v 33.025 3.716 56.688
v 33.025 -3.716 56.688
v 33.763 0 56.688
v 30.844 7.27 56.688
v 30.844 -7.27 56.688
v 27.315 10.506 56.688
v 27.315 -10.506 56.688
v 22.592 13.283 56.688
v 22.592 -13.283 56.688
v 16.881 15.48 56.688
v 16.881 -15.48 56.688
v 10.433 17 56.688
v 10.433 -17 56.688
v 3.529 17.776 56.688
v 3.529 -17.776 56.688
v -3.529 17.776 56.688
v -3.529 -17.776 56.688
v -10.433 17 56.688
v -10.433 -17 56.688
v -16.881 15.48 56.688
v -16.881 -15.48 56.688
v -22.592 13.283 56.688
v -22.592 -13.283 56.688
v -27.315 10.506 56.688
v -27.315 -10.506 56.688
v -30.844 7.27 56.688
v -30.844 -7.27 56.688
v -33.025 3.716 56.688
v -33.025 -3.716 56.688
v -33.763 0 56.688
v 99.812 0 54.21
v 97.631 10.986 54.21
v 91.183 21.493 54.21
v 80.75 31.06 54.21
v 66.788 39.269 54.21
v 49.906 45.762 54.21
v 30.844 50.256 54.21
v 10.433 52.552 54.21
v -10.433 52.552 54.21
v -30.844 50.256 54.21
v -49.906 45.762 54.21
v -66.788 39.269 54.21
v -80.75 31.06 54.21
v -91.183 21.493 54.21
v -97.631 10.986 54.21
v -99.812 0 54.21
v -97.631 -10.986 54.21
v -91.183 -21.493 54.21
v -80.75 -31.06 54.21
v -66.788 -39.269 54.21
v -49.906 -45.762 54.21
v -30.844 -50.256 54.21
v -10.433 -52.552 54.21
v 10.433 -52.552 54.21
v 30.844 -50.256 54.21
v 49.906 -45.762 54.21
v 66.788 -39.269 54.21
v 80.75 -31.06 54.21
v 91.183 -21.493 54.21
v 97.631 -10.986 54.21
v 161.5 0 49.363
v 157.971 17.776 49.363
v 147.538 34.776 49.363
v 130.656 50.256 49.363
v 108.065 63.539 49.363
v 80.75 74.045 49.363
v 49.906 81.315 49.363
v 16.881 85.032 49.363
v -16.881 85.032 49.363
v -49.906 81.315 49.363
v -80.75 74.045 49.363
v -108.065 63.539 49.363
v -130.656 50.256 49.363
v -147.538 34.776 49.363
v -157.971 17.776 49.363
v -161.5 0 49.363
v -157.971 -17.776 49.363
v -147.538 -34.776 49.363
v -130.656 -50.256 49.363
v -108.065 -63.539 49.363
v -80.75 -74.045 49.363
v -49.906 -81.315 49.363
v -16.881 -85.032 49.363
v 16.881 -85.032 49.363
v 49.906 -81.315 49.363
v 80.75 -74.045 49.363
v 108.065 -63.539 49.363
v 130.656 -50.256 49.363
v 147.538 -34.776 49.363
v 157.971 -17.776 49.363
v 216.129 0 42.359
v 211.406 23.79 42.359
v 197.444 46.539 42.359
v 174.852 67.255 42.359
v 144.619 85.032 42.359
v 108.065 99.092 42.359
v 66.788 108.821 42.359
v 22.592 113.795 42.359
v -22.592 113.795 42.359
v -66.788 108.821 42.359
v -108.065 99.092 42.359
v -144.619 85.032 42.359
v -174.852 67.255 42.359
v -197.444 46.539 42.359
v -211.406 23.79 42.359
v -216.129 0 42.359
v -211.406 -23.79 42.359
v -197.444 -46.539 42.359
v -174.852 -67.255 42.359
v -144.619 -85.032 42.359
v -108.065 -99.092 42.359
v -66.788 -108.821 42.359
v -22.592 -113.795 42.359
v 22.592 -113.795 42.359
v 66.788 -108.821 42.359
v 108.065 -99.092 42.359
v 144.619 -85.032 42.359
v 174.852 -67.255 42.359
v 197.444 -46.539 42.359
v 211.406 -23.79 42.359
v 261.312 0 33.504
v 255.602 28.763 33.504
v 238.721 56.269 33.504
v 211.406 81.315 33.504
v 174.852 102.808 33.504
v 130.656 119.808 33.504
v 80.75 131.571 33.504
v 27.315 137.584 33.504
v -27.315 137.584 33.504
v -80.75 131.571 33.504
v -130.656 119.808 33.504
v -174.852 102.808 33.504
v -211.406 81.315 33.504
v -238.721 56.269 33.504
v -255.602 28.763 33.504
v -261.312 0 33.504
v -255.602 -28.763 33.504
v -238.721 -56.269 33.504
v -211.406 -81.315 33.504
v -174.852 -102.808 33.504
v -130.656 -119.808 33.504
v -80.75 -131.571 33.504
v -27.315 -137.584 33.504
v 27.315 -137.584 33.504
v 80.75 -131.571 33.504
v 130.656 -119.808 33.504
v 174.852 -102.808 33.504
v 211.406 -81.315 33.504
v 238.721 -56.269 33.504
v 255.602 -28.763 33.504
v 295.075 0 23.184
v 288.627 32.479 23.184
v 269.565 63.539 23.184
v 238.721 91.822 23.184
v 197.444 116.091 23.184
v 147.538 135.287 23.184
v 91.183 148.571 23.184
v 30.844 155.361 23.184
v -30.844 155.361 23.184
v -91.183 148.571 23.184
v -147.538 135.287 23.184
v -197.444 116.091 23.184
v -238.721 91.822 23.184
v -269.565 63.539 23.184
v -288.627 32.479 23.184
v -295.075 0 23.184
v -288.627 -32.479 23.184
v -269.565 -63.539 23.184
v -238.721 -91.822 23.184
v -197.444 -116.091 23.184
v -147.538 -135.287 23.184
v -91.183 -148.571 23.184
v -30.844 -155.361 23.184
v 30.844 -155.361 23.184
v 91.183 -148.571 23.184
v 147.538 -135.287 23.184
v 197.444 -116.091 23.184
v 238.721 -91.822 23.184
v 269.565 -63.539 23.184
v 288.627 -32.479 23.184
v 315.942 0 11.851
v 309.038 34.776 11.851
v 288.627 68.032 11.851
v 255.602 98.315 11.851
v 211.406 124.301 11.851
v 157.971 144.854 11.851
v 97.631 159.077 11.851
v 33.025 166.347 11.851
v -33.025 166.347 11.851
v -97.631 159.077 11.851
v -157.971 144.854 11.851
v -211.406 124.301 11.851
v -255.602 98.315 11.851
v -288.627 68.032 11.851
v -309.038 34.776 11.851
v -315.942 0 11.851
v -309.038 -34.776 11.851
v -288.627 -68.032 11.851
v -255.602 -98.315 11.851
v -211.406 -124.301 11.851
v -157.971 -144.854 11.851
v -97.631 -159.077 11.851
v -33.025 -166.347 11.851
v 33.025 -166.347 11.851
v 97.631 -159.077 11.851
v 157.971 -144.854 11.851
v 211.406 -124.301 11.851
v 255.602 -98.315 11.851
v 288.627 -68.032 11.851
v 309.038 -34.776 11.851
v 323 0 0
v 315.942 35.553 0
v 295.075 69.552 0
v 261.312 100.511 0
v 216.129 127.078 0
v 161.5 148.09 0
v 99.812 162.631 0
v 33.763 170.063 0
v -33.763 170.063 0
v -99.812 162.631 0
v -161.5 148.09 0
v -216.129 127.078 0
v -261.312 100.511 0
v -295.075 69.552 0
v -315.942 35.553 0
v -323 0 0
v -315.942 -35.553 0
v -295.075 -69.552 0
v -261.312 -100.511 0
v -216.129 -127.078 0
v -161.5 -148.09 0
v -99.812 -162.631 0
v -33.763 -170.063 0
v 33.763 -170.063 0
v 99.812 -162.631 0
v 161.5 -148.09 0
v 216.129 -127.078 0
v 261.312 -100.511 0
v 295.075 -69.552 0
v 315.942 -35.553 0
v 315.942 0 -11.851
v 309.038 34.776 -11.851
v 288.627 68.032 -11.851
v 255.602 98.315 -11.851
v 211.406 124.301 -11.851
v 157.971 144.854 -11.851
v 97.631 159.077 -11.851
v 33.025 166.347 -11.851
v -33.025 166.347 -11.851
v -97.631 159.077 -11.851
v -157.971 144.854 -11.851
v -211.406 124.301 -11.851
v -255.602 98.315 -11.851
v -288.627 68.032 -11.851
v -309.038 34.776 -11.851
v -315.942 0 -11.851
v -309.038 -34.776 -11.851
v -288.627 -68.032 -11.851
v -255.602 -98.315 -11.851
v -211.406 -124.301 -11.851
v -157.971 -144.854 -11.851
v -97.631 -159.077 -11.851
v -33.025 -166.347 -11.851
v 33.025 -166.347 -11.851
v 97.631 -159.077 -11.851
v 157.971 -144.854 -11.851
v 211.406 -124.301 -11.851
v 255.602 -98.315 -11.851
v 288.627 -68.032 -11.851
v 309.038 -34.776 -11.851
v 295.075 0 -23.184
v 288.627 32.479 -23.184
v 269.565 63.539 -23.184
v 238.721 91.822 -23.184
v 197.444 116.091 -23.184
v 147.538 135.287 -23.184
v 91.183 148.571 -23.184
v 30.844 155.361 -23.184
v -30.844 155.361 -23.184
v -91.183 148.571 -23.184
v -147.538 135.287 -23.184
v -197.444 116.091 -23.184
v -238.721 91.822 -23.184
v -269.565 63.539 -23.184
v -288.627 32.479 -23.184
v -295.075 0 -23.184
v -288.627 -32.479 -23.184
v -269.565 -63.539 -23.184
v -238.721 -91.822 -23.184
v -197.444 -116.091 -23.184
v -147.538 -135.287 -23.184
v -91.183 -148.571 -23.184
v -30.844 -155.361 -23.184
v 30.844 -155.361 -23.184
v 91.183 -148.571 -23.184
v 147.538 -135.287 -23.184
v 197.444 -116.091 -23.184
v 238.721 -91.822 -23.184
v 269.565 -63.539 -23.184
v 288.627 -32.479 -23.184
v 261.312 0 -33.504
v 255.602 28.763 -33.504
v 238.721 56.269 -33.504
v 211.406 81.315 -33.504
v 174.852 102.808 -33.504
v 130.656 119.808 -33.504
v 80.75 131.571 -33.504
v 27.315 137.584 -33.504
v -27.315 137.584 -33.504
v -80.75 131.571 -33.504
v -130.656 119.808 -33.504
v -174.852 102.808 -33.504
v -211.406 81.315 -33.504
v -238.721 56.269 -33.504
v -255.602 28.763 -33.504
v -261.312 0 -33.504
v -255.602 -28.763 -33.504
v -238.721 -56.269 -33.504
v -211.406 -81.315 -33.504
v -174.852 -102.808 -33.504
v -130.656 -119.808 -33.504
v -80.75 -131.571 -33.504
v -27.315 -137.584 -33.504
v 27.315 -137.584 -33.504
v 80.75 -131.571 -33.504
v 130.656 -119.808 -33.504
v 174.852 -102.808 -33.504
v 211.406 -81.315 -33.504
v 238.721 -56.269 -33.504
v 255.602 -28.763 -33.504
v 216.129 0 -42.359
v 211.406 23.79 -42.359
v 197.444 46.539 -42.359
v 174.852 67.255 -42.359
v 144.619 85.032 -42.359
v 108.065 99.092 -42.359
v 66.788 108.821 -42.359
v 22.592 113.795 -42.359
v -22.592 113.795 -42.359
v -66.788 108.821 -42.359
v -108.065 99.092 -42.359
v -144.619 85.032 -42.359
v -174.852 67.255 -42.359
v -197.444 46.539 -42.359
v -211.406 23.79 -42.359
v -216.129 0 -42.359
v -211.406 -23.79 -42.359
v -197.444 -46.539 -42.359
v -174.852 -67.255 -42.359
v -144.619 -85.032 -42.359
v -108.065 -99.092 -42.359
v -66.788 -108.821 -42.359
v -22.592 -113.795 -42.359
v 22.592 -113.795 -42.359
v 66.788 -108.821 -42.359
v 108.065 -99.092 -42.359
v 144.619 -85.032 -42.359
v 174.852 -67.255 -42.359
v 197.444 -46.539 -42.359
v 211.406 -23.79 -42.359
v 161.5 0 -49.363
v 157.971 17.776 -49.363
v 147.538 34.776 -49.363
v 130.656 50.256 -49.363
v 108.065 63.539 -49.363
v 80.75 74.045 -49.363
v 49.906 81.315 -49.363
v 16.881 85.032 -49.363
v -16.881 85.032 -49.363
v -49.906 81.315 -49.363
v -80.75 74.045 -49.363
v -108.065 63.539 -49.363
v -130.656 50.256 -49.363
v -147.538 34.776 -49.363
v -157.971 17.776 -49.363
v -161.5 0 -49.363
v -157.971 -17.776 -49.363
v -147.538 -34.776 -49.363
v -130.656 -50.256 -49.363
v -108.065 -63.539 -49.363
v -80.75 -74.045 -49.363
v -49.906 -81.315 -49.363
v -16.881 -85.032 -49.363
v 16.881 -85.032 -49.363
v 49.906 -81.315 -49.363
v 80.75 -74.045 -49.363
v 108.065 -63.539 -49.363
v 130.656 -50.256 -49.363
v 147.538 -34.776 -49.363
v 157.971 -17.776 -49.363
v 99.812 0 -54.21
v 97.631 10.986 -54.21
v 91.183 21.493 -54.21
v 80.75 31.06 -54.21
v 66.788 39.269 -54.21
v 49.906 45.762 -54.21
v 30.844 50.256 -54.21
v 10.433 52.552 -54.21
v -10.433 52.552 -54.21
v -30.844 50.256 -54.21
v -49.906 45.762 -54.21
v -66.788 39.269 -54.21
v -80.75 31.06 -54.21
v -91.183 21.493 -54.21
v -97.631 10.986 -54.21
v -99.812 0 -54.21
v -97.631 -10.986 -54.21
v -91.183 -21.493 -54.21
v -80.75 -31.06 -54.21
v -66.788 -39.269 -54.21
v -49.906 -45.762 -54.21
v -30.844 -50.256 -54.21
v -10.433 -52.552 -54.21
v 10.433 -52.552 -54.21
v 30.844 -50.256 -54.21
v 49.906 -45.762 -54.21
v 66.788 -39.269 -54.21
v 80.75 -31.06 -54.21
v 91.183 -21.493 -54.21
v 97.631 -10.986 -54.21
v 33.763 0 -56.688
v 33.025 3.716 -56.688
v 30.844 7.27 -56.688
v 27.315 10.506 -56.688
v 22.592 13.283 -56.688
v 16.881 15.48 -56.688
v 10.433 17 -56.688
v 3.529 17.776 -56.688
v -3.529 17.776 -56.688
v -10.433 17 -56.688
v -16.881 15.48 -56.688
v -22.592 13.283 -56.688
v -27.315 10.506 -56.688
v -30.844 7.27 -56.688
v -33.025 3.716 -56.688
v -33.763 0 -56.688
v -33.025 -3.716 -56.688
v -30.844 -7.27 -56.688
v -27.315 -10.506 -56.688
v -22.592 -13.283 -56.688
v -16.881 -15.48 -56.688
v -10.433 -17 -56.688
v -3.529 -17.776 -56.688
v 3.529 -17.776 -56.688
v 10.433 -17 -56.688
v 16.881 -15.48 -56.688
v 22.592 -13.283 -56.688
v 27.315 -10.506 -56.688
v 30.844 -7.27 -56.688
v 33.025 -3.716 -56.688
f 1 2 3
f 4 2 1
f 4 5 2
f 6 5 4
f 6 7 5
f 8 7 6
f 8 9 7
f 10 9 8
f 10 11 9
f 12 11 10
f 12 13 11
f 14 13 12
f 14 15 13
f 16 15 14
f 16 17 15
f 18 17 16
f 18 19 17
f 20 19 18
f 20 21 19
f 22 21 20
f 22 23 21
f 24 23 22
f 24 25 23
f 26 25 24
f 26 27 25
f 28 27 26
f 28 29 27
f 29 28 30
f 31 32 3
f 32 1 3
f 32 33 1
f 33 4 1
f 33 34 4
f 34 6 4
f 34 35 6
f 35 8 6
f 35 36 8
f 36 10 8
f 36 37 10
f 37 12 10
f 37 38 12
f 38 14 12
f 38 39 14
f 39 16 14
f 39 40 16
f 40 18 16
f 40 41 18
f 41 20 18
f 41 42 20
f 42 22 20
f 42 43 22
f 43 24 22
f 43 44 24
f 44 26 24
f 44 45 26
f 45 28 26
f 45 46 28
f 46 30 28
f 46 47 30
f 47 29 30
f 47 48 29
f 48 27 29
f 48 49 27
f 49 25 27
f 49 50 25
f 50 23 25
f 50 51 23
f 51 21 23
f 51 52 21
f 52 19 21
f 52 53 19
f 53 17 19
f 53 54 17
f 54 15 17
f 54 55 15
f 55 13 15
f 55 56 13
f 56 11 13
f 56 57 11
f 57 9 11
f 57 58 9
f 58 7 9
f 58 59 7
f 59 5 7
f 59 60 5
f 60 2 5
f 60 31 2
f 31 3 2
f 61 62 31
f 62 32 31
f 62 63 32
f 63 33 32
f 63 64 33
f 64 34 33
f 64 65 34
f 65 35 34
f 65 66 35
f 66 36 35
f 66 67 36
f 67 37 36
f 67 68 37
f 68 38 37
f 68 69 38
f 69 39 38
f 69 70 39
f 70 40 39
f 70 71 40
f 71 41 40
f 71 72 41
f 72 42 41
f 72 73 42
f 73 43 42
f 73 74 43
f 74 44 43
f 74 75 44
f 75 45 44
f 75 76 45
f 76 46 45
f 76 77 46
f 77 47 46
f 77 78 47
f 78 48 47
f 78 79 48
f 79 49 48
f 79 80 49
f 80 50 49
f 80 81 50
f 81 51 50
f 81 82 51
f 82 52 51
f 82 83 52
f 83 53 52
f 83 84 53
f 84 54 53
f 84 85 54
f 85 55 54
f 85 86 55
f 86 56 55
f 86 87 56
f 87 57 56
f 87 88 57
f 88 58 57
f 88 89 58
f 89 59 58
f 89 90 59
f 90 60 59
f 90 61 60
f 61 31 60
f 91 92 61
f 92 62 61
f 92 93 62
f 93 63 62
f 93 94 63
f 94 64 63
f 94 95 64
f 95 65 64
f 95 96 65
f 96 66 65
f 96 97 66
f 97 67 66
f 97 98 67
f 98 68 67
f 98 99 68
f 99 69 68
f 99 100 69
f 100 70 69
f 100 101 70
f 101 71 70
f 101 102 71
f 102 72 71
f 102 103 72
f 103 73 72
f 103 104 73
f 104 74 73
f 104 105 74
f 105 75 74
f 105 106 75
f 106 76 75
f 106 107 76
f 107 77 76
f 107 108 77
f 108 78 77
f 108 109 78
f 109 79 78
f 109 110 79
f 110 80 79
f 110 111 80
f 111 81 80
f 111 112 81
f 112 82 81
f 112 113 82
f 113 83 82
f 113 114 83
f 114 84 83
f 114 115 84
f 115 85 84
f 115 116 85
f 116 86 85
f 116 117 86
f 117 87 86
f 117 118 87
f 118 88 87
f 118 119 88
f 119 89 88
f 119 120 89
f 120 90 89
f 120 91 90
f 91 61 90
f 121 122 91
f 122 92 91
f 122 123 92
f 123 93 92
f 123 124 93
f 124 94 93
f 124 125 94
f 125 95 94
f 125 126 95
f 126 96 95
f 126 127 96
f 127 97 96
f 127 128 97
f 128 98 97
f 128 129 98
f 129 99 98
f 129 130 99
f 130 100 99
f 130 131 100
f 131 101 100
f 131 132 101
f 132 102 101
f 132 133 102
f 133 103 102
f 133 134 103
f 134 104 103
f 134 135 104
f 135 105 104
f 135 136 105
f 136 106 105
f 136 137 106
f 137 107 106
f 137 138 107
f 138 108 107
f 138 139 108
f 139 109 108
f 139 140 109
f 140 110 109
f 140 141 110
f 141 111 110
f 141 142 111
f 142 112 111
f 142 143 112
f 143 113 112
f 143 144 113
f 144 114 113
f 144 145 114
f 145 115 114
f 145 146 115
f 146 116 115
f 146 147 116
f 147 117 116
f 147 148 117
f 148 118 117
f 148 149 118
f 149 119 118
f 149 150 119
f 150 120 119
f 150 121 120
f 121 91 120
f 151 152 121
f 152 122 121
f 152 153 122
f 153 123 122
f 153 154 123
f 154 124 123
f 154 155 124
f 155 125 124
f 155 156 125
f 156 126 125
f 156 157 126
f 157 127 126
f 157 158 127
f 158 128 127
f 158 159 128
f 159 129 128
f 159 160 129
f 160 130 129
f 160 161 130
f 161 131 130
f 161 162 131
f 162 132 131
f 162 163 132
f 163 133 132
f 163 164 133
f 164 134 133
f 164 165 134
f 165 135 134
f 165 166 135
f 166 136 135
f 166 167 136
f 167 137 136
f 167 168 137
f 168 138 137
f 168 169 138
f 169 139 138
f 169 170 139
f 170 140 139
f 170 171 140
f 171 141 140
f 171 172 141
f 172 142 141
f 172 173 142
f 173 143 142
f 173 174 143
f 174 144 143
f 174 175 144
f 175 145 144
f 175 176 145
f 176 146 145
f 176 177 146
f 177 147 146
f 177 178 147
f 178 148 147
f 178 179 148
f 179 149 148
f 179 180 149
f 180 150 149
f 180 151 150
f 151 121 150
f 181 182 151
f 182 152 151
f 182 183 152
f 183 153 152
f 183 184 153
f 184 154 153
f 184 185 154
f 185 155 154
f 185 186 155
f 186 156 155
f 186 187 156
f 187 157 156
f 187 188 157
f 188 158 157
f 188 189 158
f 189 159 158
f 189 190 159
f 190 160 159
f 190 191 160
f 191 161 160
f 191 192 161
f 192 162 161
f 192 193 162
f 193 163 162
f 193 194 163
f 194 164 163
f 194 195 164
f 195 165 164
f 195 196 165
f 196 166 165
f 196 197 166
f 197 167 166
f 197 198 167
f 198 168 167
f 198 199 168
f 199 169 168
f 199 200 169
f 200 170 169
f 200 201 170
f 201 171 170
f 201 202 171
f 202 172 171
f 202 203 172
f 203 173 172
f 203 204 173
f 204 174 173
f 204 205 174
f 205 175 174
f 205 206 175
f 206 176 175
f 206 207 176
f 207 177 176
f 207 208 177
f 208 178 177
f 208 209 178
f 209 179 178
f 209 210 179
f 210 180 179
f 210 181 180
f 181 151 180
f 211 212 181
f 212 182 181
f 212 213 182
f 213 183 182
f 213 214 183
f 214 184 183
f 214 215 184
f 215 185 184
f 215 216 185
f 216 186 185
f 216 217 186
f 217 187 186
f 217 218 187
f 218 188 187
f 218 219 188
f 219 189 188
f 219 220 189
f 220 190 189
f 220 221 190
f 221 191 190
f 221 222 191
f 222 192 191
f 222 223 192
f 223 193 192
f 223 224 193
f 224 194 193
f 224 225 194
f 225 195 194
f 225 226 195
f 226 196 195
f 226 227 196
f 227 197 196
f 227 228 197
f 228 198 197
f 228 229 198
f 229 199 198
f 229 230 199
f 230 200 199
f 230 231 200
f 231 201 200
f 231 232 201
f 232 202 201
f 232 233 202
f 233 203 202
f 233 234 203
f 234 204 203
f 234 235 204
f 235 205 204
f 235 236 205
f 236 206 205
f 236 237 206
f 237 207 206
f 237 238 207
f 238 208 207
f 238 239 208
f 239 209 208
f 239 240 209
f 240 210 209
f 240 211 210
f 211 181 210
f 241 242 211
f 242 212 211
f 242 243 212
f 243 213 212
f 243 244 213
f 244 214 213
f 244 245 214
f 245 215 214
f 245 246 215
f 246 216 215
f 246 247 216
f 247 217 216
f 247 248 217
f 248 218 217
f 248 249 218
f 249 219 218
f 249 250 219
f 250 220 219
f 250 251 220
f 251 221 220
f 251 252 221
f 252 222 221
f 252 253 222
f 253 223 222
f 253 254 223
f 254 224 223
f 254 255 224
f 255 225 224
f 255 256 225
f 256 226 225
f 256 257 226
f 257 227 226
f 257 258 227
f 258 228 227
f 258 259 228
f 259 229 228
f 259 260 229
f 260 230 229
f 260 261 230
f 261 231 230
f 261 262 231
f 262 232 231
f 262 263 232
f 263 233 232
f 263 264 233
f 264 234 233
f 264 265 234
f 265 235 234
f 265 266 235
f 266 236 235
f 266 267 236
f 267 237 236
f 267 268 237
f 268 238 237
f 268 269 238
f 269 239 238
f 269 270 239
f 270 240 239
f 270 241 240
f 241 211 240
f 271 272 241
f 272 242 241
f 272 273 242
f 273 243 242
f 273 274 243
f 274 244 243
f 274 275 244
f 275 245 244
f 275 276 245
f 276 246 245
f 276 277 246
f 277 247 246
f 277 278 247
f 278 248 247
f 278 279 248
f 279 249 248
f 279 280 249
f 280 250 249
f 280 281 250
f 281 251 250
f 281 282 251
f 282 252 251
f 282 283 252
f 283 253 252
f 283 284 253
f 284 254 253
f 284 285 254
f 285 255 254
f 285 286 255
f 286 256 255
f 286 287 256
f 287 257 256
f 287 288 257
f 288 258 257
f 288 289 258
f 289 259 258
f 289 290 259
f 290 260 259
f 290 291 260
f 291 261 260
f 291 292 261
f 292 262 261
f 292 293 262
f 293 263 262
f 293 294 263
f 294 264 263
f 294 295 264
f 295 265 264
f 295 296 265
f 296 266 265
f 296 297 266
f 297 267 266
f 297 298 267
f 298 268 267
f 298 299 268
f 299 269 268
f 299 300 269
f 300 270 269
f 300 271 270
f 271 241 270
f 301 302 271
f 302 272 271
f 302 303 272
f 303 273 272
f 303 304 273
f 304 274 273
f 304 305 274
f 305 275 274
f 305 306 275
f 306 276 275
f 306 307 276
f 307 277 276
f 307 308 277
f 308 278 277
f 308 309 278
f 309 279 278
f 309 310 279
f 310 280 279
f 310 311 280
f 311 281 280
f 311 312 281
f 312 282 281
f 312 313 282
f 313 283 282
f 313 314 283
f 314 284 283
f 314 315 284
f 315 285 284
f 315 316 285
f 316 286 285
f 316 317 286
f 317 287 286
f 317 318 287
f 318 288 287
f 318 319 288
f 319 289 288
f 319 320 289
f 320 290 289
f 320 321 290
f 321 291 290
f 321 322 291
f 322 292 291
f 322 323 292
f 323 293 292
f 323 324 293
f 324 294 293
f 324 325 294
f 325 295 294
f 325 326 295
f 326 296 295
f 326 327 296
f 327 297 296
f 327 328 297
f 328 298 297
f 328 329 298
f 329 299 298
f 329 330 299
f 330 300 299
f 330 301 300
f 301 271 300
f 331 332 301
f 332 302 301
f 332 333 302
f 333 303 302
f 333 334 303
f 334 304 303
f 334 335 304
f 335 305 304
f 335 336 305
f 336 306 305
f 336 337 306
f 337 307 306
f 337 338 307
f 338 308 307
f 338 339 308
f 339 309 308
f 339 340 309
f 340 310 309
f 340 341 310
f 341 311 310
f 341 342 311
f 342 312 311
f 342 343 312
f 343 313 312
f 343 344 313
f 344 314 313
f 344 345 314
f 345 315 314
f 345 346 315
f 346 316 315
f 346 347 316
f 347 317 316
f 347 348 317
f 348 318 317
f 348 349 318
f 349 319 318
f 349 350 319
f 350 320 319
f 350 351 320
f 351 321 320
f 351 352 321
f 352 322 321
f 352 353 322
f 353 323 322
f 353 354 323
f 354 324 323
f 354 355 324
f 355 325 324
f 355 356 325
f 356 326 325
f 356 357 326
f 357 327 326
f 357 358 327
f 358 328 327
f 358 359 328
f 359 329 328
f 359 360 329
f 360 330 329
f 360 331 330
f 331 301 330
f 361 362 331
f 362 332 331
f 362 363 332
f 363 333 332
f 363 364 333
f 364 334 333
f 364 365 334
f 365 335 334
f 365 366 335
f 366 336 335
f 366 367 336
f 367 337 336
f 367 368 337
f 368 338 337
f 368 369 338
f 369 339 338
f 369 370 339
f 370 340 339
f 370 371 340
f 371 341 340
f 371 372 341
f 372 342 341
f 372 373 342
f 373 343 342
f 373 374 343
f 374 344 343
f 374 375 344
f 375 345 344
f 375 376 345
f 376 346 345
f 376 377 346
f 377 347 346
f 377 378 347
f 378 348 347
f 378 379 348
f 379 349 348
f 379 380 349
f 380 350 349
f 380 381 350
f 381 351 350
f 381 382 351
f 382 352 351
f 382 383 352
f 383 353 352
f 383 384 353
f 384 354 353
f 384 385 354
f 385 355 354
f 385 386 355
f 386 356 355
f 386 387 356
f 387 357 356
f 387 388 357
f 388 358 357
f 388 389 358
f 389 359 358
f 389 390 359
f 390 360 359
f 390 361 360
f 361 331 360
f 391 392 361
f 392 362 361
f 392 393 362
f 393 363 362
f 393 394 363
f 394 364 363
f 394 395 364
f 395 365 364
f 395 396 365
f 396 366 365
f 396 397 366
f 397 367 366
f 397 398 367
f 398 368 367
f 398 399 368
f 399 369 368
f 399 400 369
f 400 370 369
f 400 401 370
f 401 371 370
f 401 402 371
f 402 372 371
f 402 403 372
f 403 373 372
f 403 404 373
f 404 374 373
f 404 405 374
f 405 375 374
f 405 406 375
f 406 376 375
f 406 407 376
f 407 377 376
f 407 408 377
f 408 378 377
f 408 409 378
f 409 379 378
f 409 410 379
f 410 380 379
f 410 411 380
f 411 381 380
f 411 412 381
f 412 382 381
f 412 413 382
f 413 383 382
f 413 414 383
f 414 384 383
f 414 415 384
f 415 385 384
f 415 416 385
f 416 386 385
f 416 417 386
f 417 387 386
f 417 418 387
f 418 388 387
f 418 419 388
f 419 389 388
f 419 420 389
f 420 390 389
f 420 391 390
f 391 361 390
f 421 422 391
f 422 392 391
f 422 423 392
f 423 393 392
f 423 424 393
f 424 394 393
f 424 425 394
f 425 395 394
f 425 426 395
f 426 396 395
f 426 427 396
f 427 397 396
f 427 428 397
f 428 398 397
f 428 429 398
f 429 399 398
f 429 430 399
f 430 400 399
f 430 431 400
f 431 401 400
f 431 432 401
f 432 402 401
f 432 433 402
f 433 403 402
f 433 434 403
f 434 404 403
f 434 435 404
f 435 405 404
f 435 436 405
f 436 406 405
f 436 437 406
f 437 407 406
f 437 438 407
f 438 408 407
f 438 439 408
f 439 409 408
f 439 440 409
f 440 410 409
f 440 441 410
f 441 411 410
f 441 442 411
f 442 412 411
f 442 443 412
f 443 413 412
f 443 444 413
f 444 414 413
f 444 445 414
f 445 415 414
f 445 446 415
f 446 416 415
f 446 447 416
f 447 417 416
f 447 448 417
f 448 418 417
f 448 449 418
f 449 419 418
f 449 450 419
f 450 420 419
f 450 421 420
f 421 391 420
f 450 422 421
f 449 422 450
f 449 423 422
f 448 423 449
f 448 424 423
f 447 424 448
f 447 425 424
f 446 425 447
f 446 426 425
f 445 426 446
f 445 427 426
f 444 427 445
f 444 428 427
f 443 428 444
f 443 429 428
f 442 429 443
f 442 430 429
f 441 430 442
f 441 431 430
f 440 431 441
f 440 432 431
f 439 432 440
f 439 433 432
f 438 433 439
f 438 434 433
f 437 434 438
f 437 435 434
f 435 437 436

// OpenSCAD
// Generated by SolidPython 1.0.1 on 2020-07-29 00:46:53


scale(v = [17, 9, 3]) {
	sphere(r = 19);
}
/***********************************************
*********      SolidPython code:      **********
************************************************
 
# import packages: SolidPython
from solid import *
from solid.utils import *
from itertools import chain, combinations, permutations


class Resize:

    def __init__(self, scad_file):
        self.scad_file = scad_file
        #self.scad_file = import_scad(scad_file)
        # cone/cylinder param:
        self.r1 = 0
        self.r2 = 0
        self.h = 0
        # rectangular prism param:
        self.w = 0
        self.l = 0
        # ellipse param:
        self.r = 0

    # import OpenScad code (file name corresponds to shape)


    # classify shape + parameters
    def assign(self, param1, param2, param3):
        if self.scad_file == 'cone.scad':
            self.r1 = param1
            self.r2 = param2
            self.h = param3
        elif self.scad_file == 'cylinder.scad':
            self.r1 = param1
            self.r2 = param2
            self.h = param3
        elif self.scad_file == 'rectangularPrism.scad':
            self.h = param1
            self.l = param2
            self.w = param3
        else:
            self.r = param1
            self.h = param2

    # resize parameters
    def iterate(self):
        x = range(3, 20, 2)
        i = 1
        if self.scad_file == 'cone.scad':
            tempList = list(permutations(x, 2))
            for temp in tempList:
                param1 = temp[0]
                param2 = temp[1]
                filepath = 'produced_scad_files/' + 'cone' + str(param1) + '_' + str(param2) + '_' + '.scad'
                scad_render_to_file(cylinder(h=param1, r1=param2, r2=0), filepath)

        elif self.scad_file == 'cylinder.scad':
            tempList = list(permutations(x, 3))
            for temp in tempList:
                param1 = temp[0]
                param2 = temp[1]
                filepath = 'produced_scad_files/' + 'cylinder' + str(param1) + '_' + str(param2) + '_' + '.scad'
                scad_render_to_file(cylinder(h=param1, r1=param2, r2=param2), filepath)

        elif self.scad_file == 'rectangularPrism.scad':
            tempList = list(permutations(x, 3))
            for temp in tempList:
                param1 = temp[0]
                param2 = temp[1]
                param3 = temp[2]
                filepath = 'produced_scad_files/' + 'rectangularPrism' + str(param1) + '_' + str(param2) + '_' + str(
                    param3) + '.scad'
                scad_render_to_file(cube(size=(param1, param2, param3)), filepath)

        elif self.scad_file == 'ellipse.scad':
            tempList = list(permutations(x, 4))
            for temp in tempList:
                param1 = temp[0]
                param2 = temp[1]
                param3 = temp[2]
                param4 = temp[3]
                filepath = 'produced_scad_files/' + 'ellipse' + str(param1) + '_' + str(param2) + '_' + str(param3) + '_' + str(param4) + '.scad'
                scad_render_to_file(scale([param1, param2, param3])(sphere(r=param4)), filepath)

    def render_to_scadfile(self):
        scad_render_to_file(scad, 'example.scad') 
 
************************************************/
